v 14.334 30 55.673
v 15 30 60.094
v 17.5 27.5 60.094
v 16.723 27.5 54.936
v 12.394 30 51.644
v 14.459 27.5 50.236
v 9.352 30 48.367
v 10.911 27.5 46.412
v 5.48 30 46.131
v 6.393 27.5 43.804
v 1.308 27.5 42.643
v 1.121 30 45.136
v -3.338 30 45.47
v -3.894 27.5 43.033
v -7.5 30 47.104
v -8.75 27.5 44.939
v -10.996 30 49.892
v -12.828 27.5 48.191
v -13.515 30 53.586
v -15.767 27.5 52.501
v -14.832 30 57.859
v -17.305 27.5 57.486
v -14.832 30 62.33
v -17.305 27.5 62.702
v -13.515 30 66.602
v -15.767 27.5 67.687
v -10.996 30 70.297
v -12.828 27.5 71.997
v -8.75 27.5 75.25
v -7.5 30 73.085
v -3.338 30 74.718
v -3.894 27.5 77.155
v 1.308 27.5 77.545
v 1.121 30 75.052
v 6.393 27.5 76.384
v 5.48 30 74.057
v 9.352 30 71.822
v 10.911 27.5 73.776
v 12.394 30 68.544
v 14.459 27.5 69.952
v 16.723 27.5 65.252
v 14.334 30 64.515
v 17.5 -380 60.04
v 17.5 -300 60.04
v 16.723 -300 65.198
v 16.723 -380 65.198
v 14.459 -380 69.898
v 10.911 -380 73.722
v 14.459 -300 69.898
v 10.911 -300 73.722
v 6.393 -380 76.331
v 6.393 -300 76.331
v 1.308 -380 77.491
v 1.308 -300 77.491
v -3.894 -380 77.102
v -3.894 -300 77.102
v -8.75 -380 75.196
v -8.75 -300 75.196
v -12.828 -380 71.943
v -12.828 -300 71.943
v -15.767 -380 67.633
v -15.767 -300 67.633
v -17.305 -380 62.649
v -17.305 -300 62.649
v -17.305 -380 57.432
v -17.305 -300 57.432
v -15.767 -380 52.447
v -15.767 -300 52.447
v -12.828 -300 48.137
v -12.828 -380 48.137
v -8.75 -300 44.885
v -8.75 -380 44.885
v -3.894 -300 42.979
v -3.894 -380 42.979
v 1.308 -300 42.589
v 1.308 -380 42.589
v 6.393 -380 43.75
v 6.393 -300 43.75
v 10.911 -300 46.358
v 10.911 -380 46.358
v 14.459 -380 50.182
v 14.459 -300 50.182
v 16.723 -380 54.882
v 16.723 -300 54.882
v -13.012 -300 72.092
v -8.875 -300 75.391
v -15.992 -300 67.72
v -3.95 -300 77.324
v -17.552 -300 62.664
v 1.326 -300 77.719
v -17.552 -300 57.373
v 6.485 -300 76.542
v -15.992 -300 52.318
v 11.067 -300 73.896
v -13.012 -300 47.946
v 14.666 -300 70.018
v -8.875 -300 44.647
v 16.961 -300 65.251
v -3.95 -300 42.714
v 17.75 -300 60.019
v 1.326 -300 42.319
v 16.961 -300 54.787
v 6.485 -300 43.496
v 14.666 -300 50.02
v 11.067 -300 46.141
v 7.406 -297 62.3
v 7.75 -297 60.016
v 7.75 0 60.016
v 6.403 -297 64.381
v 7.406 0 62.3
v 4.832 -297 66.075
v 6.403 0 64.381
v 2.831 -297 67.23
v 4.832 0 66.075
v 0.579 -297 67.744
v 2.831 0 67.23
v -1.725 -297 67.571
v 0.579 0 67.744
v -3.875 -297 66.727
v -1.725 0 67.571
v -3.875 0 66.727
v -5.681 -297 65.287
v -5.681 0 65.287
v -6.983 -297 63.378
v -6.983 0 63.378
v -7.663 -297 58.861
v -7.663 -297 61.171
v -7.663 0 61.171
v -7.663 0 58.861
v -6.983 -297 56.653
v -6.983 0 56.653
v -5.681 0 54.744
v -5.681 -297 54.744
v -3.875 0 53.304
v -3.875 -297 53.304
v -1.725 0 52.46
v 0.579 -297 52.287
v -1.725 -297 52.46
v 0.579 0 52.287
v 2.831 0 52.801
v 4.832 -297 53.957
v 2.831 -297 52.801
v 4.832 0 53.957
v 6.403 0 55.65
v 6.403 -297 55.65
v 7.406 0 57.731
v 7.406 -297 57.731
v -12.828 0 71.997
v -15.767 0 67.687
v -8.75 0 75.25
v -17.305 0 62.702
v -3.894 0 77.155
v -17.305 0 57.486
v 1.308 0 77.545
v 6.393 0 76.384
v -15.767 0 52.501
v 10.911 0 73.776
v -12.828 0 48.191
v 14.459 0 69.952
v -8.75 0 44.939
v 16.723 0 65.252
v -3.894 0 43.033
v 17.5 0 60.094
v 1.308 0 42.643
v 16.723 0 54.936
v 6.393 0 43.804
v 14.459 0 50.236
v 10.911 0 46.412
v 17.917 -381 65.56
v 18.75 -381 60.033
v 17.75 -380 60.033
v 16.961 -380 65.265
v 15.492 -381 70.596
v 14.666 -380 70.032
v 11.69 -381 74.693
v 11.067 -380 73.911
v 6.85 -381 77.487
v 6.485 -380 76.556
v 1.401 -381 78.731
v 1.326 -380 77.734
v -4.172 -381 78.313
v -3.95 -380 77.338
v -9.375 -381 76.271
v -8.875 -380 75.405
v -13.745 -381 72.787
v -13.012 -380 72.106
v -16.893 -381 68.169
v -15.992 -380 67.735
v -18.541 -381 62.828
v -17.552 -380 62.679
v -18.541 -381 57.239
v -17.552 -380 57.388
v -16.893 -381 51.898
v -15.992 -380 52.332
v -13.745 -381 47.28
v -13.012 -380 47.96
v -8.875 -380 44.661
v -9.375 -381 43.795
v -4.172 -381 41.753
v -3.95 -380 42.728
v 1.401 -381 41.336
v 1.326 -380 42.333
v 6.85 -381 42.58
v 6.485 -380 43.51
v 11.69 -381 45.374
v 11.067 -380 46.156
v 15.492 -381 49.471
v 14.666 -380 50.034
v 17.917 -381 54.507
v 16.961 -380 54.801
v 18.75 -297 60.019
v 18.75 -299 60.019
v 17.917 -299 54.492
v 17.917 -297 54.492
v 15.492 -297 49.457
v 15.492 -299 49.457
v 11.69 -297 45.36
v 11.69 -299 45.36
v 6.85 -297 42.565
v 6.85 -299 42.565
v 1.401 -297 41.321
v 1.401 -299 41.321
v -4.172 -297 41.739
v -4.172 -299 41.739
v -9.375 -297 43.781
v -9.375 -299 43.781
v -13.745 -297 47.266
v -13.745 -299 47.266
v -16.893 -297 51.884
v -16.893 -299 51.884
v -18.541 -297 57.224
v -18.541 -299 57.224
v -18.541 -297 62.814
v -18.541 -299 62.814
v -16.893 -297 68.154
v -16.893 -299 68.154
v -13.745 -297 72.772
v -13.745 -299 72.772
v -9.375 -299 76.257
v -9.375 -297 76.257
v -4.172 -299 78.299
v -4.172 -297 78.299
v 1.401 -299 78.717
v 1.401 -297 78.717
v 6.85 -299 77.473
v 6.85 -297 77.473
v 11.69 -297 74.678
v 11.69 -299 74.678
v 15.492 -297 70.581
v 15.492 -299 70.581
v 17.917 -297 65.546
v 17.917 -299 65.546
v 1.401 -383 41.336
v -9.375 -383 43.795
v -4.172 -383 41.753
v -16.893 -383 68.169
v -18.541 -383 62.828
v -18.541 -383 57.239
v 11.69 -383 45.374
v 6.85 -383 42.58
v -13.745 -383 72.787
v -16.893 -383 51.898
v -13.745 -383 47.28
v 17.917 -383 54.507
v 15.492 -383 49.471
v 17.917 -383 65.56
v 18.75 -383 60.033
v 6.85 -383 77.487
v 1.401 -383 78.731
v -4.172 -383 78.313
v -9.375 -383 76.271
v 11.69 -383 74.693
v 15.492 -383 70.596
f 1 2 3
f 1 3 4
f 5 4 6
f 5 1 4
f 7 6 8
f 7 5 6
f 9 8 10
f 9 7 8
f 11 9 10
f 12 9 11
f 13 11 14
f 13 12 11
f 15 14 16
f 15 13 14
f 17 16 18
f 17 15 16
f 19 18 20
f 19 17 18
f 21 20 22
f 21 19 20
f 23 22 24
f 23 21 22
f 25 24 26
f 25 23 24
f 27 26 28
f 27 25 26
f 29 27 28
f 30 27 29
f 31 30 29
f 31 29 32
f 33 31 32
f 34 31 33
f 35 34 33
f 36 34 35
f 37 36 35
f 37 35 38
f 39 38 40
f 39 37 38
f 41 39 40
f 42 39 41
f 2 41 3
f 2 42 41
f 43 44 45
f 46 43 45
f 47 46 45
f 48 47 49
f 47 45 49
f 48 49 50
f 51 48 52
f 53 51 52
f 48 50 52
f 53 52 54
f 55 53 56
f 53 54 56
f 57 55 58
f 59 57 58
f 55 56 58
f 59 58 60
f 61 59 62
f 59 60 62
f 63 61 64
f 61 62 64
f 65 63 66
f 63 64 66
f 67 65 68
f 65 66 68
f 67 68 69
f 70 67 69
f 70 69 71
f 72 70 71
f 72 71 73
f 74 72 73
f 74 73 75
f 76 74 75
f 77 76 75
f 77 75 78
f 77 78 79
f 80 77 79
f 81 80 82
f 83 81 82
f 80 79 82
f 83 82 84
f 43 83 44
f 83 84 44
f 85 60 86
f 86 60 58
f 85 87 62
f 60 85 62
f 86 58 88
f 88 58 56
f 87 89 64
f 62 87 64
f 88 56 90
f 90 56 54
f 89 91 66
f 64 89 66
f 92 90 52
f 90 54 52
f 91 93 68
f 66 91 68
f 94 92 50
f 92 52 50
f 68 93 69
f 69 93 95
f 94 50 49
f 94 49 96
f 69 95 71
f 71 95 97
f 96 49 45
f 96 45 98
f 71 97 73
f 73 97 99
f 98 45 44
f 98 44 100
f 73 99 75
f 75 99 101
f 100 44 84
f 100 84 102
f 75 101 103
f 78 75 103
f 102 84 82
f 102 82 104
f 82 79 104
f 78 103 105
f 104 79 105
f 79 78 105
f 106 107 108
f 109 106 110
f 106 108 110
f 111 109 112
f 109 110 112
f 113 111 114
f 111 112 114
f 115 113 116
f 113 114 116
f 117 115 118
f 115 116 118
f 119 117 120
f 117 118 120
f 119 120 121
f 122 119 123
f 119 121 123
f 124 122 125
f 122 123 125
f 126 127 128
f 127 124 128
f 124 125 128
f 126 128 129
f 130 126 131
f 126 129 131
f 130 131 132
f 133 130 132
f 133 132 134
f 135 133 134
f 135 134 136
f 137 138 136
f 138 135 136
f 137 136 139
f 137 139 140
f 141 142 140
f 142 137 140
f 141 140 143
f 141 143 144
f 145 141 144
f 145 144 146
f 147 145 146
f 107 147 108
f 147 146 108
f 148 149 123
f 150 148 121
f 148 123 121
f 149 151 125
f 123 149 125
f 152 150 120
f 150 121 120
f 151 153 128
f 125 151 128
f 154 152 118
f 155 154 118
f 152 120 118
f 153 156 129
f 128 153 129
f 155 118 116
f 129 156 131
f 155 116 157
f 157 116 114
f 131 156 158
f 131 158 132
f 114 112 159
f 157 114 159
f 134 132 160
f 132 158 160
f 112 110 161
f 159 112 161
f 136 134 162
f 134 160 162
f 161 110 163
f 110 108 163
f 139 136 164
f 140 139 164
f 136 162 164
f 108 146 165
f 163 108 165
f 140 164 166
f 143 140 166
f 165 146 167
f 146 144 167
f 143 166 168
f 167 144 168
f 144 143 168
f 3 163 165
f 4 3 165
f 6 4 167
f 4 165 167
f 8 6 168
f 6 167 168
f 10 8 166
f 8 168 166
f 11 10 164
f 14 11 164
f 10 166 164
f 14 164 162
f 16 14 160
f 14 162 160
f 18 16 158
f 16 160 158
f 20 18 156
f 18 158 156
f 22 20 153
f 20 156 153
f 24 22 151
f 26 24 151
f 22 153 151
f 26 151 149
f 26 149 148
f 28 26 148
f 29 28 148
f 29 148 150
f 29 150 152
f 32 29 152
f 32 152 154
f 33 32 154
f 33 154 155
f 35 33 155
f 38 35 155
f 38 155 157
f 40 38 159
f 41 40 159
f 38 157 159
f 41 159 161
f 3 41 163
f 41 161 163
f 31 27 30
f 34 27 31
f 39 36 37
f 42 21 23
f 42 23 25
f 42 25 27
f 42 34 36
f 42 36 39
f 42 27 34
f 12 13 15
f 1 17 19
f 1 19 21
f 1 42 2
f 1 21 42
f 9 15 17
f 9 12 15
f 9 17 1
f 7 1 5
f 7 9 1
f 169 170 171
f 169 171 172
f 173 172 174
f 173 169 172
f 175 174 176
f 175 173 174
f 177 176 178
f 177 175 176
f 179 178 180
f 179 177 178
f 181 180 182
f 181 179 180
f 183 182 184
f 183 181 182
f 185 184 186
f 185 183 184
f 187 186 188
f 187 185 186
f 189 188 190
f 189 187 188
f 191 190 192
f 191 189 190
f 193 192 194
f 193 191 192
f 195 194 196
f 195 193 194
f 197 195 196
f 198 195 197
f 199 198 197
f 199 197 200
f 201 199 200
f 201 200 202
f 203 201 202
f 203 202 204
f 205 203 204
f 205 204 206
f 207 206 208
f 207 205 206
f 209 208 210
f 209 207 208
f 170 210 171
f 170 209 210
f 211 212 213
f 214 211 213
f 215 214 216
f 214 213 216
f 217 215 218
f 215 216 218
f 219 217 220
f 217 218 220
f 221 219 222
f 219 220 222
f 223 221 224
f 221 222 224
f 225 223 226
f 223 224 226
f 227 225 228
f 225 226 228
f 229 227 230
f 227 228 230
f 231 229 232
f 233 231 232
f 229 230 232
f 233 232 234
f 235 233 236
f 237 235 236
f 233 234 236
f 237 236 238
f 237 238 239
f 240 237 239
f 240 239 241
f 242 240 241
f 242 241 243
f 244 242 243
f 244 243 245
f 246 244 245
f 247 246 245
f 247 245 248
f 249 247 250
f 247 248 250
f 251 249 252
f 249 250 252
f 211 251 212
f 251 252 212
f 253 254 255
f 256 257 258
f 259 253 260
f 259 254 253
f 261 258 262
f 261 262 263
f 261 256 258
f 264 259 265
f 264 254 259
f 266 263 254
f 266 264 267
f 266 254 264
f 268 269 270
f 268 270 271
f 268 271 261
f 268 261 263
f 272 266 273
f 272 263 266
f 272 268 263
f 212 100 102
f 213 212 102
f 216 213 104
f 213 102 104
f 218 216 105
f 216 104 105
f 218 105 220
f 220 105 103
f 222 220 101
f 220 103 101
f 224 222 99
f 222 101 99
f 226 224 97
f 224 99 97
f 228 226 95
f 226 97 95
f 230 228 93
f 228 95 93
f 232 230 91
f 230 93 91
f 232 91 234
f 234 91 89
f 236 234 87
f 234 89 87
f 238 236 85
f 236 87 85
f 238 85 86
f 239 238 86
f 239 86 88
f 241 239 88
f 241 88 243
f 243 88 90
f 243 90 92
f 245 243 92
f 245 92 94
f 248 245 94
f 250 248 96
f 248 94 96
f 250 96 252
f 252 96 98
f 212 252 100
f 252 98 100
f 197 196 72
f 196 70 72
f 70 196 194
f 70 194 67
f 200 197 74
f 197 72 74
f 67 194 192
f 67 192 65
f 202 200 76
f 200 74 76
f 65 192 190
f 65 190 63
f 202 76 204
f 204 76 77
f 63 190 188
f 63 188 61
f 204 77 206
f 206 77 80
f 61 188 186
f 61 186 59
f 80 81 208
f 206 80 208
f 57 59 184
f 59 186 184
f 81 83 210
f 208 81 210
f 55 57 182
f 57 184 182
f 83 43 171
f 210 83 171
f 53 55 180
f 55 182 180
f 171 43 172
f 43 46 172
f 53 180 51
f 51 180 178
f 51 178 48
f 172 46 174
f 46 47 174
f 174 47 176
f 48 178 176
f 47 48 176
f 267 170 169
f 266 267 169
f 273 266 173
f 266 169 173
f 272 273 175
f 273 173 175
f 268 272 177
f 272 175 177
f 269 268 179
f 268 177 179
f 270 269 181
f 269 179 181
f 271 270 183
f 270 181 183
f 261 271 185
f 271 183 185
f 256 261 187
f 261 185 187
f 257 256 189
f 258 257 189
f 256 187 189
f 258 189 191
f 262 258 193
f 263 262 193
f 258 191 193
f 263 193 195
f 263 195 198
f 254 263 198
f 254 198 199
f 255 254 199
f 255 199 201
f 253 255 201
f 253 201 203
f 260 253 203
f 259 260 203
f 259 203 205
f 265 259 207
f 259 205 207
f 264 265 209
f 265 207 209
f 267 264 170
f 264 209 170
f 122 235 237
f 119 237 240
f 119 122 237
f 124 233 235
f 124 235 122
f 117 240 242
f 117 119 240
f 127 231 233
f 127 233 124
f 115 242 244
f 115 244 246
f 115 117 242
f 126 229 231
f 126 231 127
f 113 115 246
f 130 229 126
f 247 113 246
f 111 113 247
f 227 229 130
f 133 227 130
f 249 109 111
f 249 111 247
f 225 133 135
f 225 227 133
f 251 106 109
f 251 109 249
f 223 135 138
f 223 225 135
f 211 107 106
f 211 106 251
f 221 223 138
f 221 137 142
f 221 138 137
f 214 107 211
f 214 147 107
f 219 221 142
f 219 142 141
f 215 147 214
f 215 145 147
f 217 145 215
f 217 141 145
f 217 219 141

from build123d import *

# Parameters (mm, degrees)
SKETCH016_R     = 7.75
PAD006_DEPTH    = 300
SKETCH017_R     = 17.5
PAD007_DEPTH    = 30
CHAMFER006_SIZE = 2.5
SKETCH018_R     = 17.5
PAD008_DEPTH    = 80
SKETCH019_R     = 18.75
PAD009_DEPTH    = 3
SKETCH020_R     = 18.75
PAD010_DEPTH    = 3
CHAMFER007_SIZE = 1


with BuildPart() as part:
    # Sketch016 → Pad006 (new body)
    with BuildSketch(Plane.XZ):
        with Locations((0, 60.015743)):
            Circle(SKETCH016_R)
    extrude(amount=PAD006_DEPTH)

    # Sketch017 (on Face2 of Pad006) → Pad007 (join)
    with BuildSketch(Plane(origin=(0, 0, 0), x_dir=(1, 0, 0), z_dir=(0, 1, 0))):
        with Locations((0, -60.094143)):
            Circle(SKETCH017_R)
    extrude(amount=PAD007_DEPTH)

    # Chamfer006
    chamfer006_edges = [part.edges().sort_by_distance(p)[0] for p in [
        (-17.5, 30, 60.094143),
    ]]
    chamfer(chamfer006_edges, length=CHAMFER006_SIZE)

    # Sketch018 (on Face6 of Chamfer006) → Pad008 (join)
    with BuildSketch(Plane.XZ.offset(300)):
        with Locations((0, 60.040283)):
            Circle(SKETCH018_R)
    extrude(amount=PAD008_DEPTH)

    # Sketch019 (on Face8 of Pad008) → Pad009 (join)
    with BuildSketch(Plane.XZ.offset(380)):
        with Locations((0, 60.03339)):
            Circle(SKETCH019_R)
    extrude(amount=PAD009_DEPTH)

    # Sketch020 (on Face6 of Pad009) → Pad010 (join)
    with BuildSketch(Plane(origin=(0, -300, 0), x_dir=(1, 0, 0), z_dir=(0, 1, 0))):
        with Locations((0, -60.018958)):
            Circle(SKETCH020_R)
    extrude(amount=PAD010_DEPTH)

    # Chamfer007
    chamfer007_edges = [part.edges().sort_by_distance(p)[0] for p in [
        (-18.75, -300, 60.018958),
        (-18.75, -380, 60.03339),
    ]]
    chamfer(chamfer007_edges, length=CHAMFER007_SIZE)


solid = part.part
